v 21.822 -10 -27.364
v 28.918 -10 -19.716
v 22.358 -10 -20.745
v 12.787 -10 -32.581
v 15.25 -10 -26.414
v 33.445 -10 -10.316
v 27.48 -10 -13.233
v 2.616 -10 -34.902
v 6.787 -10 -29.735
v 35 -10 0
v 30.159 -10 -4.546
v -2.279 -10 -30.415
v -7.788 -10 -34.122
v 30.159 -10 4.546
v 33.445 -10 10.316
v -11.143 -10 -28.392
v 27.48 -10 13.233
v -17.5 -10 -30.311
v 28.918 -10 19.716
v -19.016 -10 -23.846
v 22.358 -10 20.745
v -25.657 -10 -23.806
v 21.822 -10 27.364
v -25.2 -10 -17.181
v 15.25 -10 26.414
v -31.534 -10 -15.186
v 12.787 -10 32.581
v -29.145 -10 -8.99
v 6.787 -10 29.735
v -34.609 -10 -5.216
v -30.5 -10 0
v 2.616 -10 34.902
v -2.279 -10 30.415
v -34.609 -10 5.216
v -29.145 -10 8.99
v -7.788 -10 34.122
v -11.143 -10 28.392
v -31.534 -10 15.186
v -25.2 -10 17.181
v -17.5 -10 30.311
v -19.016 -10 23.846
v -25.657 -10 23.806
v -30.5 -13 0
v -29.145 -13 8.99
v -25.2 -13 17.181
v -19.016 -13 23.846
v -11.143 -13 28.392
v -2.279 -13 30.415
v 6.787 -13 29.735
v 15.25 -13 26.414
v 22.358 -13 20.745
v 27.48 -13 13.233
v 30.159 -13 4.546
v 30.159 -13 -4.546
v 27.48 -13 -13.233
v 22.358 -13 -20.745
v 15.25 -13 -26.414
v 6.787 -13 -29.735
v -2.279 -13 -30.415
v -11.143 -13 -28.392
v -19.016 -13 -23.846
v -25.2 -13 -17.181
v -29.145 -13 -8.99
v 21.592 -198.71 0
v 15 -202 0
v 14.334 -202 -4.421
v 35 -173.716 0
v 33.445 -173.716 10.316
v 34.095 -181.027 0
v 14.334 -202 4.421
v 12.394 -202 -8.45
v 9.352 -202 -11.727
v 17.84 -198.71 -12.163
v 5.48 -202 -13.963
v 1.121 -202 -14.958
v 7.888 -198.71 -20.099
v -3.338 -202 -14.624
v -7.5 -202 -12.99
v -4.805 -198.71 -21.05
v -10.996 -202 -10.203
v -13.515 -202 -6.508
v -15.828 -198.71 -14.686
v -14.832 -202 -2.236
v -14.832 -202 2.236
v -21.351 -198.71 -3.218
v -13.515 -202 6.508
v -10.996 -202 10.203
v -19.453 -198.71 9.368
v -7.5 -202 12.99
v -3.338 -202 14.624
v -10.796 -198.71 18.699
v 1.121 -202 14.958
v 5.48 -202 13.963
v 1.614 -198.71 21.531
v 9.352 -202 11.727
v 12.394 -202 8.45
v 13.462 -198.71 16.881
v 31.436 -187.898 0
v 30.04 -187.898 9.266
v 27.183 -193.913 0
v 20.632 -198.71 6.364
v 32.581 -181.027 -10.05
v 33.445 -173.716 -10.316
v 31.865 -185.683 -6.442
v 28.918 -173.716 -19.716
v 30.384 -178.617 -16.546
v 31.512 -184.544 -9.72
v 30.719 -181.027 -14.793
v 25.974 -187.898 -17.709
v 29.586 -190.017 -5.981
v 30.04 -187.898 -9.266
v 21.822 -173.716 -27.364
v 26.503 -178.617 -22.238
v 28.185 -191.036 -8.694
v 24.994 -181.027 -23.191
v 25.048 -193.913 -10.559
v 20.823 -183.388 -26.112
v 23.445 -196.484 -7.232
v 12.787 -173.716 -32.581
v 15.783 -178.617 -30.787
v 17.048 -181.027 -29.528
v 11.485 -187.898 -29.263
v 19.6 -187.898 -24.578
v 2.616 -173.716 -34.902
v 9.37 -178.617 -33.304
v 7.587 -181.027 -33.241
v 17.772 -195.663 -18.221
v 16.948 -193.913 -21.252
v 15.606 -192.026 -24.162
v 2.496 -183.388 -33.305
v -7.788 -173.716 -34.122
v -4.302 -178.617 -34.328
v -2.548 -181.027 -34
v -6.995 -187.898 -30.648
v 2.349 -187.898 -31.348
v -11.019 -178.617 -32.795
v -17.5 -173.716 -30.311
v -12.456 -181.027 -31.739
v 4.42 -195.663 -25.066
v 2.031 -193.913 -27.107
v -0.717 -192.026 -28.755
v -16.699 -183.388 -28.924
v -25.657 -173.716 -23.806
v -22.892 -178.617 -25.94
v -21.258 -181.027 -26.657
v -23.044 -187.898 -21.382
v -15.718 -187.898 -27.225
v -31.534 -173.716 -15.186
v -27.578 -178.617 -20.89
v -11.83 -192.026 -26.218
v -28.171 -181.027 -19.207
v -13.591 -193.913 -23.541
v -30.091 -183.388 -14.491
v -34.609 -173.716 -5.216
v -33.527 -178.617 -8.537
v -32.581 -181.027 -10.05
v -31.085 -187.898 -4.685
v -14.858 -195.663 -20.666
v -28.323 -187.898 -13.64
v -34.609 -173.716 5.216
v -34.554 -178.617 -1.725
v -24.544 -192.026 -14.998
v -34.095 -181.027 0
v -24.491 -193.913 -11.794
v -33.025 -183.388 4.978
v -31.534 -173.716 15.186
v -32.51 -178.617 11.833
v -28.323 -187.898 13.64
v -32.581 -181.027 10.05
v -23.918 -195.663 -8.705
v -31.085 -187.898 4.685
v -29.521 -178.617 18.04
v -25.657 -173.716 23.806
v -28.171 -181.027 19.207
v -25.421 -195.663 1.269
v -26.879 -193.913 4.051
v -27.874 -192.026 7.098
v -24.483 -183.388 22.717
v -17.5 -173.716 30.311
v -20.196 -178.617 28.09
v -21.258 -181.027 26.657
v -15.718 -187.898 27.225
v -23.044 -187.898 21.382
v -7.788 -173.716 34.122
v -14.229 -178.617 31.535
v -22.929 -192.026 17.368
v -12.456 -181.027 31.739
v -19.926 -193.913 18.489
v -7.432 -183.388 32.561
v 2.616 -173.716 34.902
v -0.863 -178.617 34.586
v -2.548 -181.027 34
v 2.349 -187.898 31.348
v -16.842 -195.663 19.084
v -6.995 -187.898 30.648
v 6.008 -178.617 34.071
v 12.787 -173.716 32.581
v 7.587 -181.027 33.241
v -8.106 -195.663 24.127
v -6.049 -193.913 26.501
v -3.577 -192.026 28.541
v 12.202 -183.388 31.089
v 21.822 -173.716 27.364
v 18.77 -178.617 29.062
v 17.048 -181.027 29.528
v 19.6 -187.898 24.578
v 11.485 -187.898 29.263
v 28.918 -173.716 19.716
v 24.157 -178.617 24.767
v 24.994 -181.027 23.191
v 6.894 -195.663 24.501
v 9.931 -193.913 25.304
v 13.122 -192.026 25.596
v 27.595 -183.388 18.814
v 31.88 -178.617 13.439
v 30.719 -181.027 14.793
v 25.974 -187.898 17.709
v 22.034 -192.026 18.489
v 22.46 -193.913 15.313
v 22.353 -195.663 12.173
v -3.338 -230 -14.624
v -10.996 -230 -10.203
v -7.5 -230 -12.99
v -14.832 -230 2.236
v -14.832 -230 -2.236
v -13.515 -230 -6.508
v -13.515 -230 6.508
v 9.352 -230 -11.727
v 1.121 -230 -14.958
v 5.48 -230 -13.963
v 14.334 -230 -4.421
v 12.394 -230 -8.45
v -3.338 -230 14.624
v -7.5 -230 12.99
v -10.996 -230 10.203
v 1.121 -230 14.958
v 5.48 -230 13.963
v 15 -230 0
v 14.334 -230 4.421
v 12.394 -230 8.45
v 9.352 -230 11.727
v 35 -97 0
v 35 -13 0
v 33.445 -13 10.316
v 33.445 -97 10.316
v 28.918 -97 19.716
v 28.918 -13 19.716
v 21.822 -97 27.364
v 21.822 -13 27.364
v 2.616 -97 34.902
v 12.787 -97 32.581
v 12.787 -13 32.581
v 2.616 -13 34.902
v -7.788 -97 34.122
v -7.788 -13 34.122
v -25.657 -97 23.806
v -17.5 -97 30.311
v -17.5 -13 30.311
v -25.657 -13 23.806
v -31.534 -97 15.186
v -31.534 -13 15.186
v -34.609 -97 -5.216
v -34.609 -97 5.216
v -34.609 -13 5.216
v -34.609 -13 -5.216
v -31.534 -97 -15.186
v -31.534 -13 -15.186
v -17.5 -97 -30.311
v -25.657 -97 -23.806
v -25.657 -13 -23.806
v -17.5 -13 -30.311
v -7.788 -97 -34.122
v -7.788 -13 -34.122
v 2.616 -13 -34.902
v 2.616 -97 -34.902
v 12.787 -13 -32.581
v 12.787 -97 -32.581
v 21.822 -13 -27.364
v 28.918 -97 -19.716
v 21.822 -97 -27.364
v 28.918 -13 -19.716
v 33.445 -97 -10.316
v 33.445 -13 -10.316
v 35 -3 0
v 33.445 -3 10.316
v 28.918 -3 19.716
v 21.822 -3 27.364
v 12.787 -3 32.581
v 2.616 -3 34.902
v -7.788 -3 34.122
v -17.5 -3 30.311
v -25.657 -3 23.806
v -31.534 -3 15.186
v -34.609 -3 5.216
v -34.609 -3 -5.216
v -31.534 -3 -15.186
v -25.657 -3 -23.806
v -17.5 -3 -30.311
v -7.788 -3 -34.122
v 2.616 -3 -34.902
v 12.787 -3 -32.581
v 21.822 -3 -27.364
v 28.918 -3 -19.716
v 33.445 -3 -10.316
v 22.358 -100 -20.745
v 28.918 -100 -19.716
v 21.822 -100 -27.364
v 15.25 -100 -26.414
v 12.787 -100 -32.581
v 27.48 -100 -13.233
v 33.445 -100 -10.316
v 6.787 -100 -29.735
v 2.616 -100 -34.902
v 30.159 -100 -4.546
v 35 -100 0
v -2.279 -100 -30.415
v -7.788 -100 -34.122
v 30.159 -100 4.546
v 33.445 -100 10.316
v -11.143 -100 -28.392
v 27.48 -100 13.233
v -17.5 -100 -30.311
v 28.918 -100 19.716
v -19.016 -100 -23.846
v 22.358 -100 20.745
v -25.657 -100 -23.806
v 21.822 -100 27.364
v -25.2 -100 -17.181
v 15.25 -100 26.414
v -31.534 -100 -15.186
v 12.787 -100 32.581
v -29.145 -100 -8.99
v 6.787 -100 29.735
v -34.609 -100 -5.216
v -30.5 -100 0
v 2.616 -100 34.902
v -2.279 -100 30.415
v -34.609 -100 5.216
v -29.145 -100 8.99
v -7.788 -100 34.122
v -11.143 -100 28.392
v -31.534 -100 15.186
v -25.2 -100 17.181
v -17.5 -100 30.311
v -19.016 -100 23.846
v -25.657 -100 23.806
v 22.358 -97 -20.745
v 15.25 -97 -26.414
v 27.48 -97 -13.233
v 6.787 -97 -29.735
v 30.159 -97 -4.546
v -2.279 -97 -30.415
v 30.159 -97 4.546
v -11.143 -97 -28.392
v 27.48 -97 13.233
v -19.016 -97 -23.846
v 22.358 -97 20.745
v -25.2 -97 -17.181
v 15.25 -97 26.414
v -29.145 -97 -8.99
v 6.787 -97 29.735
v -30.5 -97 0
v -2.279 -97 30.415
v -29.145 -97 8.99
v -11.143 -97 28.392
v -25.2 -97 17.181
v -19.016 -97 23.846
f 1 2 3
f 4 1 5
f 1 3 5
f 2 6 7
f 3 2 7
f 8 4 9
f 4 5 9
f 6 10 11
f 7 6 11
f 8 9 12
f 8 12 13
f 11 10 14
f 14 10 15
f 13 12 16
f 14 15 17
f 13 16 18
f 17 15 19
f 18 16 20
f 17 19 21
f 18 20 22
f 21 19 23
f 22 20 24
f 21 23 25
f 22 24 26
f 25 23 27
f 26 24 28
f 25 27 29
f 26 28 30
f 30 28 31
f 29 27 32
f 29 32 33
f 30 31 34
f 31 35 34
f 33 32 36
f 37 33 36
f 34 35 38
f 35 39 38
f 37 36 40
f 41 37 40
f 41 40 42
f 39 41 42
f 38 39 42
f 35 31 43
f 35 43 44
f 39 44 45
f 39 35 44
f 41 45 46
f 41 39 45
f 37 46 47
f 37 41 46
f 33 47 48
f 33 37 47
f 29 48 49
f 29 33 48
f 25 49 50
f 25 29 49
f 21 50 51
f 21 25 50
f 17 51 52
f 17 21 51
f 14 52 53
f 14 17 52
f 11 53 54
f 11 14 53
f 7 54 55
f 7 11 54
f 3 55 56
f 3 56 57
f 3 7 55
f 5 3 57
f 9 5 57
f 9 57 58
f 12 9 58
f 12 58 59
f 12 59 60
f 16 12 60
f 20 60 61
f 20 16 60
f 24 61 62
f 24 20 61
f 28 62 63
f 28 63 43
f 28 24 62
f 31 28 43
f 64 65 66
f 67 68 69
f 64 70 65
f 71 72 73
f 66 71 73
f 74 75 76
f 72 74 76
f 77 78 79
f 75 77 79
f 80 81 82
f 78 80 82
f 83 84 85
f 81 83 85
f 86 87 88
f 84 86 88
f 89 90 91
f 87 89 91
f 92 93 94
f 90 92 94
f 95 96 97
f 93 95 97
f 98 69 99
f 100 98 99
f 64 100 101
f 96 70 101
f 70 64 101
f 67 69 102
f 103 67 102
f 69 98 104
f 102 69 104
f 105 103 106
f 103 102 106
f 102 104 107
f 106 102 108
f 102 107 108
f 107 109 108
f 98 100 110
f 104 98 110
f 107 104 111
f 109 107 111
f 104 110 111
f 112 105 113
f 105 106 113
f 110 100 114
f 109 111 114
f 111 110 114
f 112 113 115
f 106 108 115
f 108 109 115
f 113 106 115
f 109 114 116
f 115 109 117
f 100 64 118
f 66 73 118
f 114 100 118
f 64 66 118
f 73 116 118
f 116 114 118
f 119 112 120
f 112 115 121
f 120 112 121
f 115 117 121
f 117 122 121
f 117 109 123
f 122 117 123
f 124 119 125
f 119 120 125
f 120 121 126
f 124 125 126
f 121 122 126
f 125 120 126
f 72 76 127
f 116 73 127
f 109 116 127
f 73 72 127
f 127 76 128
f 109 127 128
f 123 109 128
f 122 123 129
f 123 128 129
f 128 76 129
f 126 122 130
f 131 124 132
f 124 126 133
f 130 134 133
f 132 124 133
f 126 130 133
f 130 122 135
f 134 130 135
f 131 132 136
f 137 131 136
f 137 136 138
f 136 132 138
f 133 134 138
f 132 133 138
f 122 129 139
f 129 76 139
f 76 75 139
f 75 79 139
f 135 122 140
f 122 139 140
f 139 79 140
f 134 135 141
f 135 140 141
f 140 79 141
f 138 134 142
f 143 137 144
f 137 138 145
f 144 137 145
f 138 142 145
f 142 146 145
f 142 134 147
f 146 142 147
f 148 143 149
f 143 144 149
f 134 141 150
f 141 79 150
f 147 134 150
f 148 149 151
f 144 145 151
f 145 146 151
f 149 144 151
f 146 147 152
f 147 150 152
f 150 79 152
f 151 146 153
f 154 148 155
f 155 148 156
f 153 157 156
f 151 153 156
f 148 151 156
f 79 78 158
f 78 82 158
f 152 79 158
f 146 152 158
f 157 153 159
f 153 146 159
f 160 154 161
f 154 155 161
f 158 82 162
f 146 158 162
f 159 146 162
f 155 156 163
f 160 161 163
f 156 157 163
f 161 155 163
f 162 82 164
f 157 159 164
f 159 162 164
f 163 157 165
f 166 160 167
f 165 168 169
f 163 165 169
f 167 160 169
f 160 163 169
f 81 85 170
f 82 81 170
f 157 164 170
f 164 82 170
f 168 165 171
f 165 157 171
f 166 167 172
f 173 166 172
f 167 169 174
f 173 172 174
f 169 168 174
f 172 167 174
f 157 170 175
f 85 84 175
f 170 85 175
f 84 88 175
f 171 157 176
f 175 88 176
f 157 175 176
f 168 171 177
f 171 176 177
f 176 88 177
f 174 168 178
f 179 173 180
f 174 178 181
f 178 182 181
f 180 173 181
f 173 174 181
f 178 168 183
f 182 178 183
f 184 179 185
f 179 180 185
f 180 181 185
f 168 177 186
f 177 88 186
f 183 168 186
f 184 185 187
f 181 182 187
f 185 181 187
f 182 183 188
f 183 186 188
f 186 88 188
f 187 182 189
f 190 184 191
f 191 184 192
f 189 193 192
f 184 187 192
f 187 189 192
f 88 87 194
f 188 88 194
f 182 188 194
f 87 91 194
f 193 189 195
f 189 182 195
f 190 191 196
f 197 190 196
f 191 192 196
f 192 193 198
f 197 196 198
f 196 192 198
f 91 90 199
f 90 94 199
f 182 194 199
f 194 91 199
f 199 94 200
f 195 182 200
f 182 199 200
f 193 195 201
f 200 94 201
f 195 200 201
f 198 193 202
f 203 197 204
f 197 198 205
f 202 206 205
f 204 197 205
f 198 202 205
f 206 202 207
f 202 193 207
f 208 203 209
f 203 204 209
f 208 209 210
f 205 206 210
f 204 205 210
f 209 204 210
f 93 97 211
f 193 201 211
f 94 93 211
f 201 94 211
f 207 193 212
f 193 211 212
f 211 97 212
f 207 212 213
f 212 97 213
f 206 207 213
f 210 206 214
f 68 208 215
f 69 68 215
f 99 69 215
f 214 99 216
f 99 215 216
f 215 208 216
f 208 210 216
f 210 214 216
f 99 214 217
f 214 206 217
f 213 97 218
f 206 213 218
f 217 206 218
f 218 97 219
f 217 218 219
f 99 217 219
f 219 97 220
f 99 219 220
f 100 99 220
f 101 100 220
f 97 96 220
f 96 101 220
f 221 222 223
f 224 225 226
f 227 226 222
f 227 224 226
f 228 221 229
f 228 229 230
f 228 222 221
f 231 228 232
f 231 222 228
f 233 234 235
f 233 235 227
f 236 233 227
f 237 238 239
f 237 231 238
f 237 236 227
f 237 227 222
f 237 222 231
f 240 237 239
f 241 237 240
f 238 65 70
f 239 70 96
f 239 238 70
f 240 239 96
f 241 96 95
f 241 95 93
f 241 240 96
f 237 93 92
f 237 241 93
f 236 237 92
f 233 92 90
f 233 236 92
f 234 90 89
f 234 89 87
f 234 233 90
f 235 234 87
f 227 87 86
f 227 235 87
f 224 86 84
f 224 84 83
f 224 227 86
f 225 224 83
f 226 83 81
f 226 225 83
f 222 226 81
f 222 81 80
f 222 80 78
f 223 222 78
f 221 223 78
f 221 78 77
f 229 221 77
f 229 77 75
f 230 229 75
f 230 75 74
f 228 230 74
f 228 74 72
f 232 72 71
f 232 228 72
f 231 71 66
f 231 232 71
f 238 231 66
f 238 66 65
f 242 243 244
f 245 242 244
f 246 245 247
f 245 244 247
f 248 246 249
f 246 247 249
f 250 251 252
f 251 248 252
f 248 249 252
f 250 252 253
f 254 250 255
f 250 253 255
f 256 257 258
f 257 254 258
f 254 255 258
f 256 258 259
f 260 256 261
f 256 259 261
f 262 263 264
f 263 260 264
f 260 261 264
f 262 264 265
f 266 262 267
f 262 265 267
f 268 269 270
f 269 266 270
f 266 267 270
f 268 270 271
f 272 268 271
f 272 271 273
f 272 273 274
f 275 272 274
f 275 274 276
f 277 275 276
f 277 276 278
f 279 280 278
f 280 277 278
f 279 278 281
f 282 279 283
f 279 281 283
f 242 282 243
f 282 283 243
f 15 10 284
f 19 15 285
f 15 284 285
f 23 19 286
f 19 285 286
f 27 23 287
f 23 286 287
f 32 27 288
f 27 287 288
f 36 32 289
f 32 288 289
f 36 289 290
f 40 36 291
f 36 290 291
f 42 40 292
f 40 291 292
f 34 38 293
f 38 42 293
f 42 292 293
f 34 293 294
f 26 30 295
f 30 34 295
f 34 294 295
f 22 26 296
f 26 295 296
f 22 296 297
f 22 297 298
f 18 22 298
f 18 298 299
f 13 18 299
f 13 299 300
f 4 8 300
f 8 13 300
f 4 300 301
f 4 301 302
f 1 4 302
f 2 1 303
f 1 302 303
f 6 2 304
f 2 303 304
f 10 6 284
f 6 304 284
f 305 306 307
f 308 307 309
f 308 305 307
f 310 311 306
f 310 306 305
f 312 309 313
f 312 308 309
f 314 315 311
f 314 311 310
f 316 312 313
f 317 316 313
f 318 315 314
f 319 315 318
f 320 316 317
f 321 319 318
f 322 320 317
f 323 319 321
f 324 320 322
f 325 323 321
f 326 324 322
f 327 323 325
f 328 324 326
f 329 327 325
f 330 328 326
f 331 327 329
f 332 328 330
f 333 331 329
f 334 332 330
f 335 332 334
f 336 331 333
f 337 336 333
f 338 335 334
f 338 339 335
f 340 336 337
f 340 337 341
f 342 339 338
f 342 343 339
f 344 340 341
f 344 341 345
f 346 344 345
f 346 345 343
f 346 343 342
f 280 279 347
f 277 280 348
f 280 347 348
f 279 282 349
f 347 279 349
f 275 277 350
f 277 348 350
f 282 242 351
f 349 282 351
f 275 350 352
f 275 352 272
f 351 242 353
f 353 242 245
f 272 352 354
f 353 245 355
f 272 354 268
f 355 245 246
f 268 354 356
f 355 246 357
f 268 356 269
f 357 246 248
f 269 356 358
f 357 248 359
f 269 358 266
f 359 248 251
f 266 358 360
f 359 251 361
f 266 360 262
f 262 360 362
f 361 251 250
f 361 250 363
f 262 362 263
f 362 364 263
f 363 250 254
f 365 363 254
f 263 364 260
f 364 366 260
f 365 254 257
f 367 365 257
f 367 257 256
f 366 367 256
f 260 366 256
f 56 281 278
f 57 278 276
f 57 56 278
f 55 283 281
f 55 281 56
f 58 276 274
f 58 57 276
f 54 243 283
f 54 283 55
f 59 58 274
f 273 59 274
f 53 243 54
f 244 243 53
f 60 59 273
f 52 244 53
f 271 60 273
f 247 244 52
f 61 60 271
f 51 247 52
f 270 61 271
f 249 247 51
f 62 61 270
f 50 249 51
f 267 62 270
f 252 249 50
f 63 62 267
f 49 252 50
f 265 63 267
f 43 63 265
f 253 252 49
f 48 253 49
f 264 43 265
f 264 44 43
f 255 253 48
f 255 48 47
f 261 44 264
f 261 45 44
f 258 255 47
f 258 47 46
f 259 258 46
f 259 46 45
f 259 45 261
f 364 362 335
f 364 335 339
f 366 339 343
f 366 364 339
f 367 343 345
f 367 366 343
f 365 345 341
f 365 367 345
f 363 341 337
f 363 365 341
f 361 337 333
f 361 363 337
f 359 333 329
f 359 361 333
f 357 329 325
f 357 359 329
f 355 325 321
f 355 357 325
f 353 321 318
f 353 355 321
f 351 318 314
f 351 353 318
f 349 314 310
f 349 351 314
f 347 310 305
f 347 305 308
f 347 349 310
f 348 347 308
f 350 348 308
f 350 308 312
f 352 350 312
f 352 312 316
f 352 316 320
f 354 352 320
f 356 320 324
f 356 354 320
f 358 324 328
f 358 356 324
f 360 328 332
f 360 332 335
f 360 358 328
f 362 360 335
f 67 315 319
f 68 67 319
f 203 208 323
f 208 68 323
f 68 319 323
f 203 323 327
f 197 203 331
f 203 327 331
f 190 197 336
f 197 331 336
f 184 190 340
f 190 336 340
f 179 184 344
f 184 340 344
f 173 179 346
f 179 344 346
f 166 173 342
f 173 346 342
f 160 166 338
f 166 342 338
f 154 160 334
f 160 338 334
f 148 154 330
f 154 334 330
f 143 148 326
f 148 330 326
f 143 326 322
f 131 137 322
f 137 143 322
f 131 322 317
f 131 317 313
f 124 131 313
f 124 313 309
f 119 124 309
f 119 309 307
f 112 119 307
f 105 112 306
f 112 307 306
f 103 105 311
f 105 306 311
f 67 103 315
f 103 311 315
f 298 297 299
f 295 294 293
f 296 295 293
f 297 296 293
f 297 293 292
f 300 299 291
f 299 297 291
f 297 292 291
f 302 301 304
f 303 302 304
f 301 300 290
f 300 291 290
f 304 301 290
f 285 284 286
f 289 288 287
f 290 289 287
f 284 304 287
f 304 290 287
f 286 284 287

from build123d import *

# Parameters (mm, degrees)
F0_R     = 35
F1_DEPTH = 230
F3_R     = 40.5
F3_R_2   = 30.5
F4_DEPTH = 3
F6_R     = 36.6776
F6_R_2   = 30.5
F7_DEPTH = 3
F8_R     = 38.3794
F8_R_2   = 15
F9_DEPTH = 28


# Not quite as in the source:
# - a fillet or chamfer that OpenCascade refuses, or shapes differently, is made with other operations: its cross-section is extruded or revolved along the edge and cut away or added


with BuildPart() as f1:
    # F0 (on Front) → F1 (new body)
    with BuildSketch(Plane.XZ):
        Circle(F0_R)
    extrude(amount=F1_DEPTH)

    # F3 (on offset) + F0 (on Front) → F4 (cut)
    with BuildSketch(Plane(origin=(0, -10, 0), x_dir=(-1, 0, 0), z_dir=(0, 1, 0))):
        Circle(F3_R)
        Circle(F3_R_2, mode=Mode.SUBTRACT)
    with BuildSketch(Plane.XZ):
        Circle(F0_R)
    extrude(amount=-F4_DEPTH, dir=(0, 1, 0), mode=Mode.SUBTRACT)

    # F6 (on offset) → F7 (cut)
    with BuildSketch(Plane(origin=(0, -97, 0), x_dir=(-1, 0, 0), z_dir=(0, 1, 0))):
        Circle(F6_R)
        Circle(F6_R_2, mode=Mode.SUBTRACT)
    extrude(amount=-F7_DEPTH, mode=Mode.SUBTRACT)

    # F8 (on face) → F9 (cut)
    with BuildSketch(Plane.XZ.offset(230)):
        Circle(F8_R)
        Circle(F8_R_2, mode=Mode.SUBTRACT)
    extrude(amount=-F9_DEPTH, mode=Mode.SUBTRACT)

    # F10: fillet of radius 30 on 1 edges, made by hand

    # F10_s1 → F10_t2 (revolve, cut)
    with BuildSketch(Plane.XY):
        with BuildLine():
            ThreePointArc((35, -173.7157287525), (29.4948974278, -191.0362368282), (15, -202))
            Line((15, -202), (35, -202))
            Line((35, -202), (35, -173.7157287525))
        make_face()
    revolve(axis=Axis((0, -202, 0), (0, 1, 0)), mode=Mode.SUBTRACT)


solid = f1.part
